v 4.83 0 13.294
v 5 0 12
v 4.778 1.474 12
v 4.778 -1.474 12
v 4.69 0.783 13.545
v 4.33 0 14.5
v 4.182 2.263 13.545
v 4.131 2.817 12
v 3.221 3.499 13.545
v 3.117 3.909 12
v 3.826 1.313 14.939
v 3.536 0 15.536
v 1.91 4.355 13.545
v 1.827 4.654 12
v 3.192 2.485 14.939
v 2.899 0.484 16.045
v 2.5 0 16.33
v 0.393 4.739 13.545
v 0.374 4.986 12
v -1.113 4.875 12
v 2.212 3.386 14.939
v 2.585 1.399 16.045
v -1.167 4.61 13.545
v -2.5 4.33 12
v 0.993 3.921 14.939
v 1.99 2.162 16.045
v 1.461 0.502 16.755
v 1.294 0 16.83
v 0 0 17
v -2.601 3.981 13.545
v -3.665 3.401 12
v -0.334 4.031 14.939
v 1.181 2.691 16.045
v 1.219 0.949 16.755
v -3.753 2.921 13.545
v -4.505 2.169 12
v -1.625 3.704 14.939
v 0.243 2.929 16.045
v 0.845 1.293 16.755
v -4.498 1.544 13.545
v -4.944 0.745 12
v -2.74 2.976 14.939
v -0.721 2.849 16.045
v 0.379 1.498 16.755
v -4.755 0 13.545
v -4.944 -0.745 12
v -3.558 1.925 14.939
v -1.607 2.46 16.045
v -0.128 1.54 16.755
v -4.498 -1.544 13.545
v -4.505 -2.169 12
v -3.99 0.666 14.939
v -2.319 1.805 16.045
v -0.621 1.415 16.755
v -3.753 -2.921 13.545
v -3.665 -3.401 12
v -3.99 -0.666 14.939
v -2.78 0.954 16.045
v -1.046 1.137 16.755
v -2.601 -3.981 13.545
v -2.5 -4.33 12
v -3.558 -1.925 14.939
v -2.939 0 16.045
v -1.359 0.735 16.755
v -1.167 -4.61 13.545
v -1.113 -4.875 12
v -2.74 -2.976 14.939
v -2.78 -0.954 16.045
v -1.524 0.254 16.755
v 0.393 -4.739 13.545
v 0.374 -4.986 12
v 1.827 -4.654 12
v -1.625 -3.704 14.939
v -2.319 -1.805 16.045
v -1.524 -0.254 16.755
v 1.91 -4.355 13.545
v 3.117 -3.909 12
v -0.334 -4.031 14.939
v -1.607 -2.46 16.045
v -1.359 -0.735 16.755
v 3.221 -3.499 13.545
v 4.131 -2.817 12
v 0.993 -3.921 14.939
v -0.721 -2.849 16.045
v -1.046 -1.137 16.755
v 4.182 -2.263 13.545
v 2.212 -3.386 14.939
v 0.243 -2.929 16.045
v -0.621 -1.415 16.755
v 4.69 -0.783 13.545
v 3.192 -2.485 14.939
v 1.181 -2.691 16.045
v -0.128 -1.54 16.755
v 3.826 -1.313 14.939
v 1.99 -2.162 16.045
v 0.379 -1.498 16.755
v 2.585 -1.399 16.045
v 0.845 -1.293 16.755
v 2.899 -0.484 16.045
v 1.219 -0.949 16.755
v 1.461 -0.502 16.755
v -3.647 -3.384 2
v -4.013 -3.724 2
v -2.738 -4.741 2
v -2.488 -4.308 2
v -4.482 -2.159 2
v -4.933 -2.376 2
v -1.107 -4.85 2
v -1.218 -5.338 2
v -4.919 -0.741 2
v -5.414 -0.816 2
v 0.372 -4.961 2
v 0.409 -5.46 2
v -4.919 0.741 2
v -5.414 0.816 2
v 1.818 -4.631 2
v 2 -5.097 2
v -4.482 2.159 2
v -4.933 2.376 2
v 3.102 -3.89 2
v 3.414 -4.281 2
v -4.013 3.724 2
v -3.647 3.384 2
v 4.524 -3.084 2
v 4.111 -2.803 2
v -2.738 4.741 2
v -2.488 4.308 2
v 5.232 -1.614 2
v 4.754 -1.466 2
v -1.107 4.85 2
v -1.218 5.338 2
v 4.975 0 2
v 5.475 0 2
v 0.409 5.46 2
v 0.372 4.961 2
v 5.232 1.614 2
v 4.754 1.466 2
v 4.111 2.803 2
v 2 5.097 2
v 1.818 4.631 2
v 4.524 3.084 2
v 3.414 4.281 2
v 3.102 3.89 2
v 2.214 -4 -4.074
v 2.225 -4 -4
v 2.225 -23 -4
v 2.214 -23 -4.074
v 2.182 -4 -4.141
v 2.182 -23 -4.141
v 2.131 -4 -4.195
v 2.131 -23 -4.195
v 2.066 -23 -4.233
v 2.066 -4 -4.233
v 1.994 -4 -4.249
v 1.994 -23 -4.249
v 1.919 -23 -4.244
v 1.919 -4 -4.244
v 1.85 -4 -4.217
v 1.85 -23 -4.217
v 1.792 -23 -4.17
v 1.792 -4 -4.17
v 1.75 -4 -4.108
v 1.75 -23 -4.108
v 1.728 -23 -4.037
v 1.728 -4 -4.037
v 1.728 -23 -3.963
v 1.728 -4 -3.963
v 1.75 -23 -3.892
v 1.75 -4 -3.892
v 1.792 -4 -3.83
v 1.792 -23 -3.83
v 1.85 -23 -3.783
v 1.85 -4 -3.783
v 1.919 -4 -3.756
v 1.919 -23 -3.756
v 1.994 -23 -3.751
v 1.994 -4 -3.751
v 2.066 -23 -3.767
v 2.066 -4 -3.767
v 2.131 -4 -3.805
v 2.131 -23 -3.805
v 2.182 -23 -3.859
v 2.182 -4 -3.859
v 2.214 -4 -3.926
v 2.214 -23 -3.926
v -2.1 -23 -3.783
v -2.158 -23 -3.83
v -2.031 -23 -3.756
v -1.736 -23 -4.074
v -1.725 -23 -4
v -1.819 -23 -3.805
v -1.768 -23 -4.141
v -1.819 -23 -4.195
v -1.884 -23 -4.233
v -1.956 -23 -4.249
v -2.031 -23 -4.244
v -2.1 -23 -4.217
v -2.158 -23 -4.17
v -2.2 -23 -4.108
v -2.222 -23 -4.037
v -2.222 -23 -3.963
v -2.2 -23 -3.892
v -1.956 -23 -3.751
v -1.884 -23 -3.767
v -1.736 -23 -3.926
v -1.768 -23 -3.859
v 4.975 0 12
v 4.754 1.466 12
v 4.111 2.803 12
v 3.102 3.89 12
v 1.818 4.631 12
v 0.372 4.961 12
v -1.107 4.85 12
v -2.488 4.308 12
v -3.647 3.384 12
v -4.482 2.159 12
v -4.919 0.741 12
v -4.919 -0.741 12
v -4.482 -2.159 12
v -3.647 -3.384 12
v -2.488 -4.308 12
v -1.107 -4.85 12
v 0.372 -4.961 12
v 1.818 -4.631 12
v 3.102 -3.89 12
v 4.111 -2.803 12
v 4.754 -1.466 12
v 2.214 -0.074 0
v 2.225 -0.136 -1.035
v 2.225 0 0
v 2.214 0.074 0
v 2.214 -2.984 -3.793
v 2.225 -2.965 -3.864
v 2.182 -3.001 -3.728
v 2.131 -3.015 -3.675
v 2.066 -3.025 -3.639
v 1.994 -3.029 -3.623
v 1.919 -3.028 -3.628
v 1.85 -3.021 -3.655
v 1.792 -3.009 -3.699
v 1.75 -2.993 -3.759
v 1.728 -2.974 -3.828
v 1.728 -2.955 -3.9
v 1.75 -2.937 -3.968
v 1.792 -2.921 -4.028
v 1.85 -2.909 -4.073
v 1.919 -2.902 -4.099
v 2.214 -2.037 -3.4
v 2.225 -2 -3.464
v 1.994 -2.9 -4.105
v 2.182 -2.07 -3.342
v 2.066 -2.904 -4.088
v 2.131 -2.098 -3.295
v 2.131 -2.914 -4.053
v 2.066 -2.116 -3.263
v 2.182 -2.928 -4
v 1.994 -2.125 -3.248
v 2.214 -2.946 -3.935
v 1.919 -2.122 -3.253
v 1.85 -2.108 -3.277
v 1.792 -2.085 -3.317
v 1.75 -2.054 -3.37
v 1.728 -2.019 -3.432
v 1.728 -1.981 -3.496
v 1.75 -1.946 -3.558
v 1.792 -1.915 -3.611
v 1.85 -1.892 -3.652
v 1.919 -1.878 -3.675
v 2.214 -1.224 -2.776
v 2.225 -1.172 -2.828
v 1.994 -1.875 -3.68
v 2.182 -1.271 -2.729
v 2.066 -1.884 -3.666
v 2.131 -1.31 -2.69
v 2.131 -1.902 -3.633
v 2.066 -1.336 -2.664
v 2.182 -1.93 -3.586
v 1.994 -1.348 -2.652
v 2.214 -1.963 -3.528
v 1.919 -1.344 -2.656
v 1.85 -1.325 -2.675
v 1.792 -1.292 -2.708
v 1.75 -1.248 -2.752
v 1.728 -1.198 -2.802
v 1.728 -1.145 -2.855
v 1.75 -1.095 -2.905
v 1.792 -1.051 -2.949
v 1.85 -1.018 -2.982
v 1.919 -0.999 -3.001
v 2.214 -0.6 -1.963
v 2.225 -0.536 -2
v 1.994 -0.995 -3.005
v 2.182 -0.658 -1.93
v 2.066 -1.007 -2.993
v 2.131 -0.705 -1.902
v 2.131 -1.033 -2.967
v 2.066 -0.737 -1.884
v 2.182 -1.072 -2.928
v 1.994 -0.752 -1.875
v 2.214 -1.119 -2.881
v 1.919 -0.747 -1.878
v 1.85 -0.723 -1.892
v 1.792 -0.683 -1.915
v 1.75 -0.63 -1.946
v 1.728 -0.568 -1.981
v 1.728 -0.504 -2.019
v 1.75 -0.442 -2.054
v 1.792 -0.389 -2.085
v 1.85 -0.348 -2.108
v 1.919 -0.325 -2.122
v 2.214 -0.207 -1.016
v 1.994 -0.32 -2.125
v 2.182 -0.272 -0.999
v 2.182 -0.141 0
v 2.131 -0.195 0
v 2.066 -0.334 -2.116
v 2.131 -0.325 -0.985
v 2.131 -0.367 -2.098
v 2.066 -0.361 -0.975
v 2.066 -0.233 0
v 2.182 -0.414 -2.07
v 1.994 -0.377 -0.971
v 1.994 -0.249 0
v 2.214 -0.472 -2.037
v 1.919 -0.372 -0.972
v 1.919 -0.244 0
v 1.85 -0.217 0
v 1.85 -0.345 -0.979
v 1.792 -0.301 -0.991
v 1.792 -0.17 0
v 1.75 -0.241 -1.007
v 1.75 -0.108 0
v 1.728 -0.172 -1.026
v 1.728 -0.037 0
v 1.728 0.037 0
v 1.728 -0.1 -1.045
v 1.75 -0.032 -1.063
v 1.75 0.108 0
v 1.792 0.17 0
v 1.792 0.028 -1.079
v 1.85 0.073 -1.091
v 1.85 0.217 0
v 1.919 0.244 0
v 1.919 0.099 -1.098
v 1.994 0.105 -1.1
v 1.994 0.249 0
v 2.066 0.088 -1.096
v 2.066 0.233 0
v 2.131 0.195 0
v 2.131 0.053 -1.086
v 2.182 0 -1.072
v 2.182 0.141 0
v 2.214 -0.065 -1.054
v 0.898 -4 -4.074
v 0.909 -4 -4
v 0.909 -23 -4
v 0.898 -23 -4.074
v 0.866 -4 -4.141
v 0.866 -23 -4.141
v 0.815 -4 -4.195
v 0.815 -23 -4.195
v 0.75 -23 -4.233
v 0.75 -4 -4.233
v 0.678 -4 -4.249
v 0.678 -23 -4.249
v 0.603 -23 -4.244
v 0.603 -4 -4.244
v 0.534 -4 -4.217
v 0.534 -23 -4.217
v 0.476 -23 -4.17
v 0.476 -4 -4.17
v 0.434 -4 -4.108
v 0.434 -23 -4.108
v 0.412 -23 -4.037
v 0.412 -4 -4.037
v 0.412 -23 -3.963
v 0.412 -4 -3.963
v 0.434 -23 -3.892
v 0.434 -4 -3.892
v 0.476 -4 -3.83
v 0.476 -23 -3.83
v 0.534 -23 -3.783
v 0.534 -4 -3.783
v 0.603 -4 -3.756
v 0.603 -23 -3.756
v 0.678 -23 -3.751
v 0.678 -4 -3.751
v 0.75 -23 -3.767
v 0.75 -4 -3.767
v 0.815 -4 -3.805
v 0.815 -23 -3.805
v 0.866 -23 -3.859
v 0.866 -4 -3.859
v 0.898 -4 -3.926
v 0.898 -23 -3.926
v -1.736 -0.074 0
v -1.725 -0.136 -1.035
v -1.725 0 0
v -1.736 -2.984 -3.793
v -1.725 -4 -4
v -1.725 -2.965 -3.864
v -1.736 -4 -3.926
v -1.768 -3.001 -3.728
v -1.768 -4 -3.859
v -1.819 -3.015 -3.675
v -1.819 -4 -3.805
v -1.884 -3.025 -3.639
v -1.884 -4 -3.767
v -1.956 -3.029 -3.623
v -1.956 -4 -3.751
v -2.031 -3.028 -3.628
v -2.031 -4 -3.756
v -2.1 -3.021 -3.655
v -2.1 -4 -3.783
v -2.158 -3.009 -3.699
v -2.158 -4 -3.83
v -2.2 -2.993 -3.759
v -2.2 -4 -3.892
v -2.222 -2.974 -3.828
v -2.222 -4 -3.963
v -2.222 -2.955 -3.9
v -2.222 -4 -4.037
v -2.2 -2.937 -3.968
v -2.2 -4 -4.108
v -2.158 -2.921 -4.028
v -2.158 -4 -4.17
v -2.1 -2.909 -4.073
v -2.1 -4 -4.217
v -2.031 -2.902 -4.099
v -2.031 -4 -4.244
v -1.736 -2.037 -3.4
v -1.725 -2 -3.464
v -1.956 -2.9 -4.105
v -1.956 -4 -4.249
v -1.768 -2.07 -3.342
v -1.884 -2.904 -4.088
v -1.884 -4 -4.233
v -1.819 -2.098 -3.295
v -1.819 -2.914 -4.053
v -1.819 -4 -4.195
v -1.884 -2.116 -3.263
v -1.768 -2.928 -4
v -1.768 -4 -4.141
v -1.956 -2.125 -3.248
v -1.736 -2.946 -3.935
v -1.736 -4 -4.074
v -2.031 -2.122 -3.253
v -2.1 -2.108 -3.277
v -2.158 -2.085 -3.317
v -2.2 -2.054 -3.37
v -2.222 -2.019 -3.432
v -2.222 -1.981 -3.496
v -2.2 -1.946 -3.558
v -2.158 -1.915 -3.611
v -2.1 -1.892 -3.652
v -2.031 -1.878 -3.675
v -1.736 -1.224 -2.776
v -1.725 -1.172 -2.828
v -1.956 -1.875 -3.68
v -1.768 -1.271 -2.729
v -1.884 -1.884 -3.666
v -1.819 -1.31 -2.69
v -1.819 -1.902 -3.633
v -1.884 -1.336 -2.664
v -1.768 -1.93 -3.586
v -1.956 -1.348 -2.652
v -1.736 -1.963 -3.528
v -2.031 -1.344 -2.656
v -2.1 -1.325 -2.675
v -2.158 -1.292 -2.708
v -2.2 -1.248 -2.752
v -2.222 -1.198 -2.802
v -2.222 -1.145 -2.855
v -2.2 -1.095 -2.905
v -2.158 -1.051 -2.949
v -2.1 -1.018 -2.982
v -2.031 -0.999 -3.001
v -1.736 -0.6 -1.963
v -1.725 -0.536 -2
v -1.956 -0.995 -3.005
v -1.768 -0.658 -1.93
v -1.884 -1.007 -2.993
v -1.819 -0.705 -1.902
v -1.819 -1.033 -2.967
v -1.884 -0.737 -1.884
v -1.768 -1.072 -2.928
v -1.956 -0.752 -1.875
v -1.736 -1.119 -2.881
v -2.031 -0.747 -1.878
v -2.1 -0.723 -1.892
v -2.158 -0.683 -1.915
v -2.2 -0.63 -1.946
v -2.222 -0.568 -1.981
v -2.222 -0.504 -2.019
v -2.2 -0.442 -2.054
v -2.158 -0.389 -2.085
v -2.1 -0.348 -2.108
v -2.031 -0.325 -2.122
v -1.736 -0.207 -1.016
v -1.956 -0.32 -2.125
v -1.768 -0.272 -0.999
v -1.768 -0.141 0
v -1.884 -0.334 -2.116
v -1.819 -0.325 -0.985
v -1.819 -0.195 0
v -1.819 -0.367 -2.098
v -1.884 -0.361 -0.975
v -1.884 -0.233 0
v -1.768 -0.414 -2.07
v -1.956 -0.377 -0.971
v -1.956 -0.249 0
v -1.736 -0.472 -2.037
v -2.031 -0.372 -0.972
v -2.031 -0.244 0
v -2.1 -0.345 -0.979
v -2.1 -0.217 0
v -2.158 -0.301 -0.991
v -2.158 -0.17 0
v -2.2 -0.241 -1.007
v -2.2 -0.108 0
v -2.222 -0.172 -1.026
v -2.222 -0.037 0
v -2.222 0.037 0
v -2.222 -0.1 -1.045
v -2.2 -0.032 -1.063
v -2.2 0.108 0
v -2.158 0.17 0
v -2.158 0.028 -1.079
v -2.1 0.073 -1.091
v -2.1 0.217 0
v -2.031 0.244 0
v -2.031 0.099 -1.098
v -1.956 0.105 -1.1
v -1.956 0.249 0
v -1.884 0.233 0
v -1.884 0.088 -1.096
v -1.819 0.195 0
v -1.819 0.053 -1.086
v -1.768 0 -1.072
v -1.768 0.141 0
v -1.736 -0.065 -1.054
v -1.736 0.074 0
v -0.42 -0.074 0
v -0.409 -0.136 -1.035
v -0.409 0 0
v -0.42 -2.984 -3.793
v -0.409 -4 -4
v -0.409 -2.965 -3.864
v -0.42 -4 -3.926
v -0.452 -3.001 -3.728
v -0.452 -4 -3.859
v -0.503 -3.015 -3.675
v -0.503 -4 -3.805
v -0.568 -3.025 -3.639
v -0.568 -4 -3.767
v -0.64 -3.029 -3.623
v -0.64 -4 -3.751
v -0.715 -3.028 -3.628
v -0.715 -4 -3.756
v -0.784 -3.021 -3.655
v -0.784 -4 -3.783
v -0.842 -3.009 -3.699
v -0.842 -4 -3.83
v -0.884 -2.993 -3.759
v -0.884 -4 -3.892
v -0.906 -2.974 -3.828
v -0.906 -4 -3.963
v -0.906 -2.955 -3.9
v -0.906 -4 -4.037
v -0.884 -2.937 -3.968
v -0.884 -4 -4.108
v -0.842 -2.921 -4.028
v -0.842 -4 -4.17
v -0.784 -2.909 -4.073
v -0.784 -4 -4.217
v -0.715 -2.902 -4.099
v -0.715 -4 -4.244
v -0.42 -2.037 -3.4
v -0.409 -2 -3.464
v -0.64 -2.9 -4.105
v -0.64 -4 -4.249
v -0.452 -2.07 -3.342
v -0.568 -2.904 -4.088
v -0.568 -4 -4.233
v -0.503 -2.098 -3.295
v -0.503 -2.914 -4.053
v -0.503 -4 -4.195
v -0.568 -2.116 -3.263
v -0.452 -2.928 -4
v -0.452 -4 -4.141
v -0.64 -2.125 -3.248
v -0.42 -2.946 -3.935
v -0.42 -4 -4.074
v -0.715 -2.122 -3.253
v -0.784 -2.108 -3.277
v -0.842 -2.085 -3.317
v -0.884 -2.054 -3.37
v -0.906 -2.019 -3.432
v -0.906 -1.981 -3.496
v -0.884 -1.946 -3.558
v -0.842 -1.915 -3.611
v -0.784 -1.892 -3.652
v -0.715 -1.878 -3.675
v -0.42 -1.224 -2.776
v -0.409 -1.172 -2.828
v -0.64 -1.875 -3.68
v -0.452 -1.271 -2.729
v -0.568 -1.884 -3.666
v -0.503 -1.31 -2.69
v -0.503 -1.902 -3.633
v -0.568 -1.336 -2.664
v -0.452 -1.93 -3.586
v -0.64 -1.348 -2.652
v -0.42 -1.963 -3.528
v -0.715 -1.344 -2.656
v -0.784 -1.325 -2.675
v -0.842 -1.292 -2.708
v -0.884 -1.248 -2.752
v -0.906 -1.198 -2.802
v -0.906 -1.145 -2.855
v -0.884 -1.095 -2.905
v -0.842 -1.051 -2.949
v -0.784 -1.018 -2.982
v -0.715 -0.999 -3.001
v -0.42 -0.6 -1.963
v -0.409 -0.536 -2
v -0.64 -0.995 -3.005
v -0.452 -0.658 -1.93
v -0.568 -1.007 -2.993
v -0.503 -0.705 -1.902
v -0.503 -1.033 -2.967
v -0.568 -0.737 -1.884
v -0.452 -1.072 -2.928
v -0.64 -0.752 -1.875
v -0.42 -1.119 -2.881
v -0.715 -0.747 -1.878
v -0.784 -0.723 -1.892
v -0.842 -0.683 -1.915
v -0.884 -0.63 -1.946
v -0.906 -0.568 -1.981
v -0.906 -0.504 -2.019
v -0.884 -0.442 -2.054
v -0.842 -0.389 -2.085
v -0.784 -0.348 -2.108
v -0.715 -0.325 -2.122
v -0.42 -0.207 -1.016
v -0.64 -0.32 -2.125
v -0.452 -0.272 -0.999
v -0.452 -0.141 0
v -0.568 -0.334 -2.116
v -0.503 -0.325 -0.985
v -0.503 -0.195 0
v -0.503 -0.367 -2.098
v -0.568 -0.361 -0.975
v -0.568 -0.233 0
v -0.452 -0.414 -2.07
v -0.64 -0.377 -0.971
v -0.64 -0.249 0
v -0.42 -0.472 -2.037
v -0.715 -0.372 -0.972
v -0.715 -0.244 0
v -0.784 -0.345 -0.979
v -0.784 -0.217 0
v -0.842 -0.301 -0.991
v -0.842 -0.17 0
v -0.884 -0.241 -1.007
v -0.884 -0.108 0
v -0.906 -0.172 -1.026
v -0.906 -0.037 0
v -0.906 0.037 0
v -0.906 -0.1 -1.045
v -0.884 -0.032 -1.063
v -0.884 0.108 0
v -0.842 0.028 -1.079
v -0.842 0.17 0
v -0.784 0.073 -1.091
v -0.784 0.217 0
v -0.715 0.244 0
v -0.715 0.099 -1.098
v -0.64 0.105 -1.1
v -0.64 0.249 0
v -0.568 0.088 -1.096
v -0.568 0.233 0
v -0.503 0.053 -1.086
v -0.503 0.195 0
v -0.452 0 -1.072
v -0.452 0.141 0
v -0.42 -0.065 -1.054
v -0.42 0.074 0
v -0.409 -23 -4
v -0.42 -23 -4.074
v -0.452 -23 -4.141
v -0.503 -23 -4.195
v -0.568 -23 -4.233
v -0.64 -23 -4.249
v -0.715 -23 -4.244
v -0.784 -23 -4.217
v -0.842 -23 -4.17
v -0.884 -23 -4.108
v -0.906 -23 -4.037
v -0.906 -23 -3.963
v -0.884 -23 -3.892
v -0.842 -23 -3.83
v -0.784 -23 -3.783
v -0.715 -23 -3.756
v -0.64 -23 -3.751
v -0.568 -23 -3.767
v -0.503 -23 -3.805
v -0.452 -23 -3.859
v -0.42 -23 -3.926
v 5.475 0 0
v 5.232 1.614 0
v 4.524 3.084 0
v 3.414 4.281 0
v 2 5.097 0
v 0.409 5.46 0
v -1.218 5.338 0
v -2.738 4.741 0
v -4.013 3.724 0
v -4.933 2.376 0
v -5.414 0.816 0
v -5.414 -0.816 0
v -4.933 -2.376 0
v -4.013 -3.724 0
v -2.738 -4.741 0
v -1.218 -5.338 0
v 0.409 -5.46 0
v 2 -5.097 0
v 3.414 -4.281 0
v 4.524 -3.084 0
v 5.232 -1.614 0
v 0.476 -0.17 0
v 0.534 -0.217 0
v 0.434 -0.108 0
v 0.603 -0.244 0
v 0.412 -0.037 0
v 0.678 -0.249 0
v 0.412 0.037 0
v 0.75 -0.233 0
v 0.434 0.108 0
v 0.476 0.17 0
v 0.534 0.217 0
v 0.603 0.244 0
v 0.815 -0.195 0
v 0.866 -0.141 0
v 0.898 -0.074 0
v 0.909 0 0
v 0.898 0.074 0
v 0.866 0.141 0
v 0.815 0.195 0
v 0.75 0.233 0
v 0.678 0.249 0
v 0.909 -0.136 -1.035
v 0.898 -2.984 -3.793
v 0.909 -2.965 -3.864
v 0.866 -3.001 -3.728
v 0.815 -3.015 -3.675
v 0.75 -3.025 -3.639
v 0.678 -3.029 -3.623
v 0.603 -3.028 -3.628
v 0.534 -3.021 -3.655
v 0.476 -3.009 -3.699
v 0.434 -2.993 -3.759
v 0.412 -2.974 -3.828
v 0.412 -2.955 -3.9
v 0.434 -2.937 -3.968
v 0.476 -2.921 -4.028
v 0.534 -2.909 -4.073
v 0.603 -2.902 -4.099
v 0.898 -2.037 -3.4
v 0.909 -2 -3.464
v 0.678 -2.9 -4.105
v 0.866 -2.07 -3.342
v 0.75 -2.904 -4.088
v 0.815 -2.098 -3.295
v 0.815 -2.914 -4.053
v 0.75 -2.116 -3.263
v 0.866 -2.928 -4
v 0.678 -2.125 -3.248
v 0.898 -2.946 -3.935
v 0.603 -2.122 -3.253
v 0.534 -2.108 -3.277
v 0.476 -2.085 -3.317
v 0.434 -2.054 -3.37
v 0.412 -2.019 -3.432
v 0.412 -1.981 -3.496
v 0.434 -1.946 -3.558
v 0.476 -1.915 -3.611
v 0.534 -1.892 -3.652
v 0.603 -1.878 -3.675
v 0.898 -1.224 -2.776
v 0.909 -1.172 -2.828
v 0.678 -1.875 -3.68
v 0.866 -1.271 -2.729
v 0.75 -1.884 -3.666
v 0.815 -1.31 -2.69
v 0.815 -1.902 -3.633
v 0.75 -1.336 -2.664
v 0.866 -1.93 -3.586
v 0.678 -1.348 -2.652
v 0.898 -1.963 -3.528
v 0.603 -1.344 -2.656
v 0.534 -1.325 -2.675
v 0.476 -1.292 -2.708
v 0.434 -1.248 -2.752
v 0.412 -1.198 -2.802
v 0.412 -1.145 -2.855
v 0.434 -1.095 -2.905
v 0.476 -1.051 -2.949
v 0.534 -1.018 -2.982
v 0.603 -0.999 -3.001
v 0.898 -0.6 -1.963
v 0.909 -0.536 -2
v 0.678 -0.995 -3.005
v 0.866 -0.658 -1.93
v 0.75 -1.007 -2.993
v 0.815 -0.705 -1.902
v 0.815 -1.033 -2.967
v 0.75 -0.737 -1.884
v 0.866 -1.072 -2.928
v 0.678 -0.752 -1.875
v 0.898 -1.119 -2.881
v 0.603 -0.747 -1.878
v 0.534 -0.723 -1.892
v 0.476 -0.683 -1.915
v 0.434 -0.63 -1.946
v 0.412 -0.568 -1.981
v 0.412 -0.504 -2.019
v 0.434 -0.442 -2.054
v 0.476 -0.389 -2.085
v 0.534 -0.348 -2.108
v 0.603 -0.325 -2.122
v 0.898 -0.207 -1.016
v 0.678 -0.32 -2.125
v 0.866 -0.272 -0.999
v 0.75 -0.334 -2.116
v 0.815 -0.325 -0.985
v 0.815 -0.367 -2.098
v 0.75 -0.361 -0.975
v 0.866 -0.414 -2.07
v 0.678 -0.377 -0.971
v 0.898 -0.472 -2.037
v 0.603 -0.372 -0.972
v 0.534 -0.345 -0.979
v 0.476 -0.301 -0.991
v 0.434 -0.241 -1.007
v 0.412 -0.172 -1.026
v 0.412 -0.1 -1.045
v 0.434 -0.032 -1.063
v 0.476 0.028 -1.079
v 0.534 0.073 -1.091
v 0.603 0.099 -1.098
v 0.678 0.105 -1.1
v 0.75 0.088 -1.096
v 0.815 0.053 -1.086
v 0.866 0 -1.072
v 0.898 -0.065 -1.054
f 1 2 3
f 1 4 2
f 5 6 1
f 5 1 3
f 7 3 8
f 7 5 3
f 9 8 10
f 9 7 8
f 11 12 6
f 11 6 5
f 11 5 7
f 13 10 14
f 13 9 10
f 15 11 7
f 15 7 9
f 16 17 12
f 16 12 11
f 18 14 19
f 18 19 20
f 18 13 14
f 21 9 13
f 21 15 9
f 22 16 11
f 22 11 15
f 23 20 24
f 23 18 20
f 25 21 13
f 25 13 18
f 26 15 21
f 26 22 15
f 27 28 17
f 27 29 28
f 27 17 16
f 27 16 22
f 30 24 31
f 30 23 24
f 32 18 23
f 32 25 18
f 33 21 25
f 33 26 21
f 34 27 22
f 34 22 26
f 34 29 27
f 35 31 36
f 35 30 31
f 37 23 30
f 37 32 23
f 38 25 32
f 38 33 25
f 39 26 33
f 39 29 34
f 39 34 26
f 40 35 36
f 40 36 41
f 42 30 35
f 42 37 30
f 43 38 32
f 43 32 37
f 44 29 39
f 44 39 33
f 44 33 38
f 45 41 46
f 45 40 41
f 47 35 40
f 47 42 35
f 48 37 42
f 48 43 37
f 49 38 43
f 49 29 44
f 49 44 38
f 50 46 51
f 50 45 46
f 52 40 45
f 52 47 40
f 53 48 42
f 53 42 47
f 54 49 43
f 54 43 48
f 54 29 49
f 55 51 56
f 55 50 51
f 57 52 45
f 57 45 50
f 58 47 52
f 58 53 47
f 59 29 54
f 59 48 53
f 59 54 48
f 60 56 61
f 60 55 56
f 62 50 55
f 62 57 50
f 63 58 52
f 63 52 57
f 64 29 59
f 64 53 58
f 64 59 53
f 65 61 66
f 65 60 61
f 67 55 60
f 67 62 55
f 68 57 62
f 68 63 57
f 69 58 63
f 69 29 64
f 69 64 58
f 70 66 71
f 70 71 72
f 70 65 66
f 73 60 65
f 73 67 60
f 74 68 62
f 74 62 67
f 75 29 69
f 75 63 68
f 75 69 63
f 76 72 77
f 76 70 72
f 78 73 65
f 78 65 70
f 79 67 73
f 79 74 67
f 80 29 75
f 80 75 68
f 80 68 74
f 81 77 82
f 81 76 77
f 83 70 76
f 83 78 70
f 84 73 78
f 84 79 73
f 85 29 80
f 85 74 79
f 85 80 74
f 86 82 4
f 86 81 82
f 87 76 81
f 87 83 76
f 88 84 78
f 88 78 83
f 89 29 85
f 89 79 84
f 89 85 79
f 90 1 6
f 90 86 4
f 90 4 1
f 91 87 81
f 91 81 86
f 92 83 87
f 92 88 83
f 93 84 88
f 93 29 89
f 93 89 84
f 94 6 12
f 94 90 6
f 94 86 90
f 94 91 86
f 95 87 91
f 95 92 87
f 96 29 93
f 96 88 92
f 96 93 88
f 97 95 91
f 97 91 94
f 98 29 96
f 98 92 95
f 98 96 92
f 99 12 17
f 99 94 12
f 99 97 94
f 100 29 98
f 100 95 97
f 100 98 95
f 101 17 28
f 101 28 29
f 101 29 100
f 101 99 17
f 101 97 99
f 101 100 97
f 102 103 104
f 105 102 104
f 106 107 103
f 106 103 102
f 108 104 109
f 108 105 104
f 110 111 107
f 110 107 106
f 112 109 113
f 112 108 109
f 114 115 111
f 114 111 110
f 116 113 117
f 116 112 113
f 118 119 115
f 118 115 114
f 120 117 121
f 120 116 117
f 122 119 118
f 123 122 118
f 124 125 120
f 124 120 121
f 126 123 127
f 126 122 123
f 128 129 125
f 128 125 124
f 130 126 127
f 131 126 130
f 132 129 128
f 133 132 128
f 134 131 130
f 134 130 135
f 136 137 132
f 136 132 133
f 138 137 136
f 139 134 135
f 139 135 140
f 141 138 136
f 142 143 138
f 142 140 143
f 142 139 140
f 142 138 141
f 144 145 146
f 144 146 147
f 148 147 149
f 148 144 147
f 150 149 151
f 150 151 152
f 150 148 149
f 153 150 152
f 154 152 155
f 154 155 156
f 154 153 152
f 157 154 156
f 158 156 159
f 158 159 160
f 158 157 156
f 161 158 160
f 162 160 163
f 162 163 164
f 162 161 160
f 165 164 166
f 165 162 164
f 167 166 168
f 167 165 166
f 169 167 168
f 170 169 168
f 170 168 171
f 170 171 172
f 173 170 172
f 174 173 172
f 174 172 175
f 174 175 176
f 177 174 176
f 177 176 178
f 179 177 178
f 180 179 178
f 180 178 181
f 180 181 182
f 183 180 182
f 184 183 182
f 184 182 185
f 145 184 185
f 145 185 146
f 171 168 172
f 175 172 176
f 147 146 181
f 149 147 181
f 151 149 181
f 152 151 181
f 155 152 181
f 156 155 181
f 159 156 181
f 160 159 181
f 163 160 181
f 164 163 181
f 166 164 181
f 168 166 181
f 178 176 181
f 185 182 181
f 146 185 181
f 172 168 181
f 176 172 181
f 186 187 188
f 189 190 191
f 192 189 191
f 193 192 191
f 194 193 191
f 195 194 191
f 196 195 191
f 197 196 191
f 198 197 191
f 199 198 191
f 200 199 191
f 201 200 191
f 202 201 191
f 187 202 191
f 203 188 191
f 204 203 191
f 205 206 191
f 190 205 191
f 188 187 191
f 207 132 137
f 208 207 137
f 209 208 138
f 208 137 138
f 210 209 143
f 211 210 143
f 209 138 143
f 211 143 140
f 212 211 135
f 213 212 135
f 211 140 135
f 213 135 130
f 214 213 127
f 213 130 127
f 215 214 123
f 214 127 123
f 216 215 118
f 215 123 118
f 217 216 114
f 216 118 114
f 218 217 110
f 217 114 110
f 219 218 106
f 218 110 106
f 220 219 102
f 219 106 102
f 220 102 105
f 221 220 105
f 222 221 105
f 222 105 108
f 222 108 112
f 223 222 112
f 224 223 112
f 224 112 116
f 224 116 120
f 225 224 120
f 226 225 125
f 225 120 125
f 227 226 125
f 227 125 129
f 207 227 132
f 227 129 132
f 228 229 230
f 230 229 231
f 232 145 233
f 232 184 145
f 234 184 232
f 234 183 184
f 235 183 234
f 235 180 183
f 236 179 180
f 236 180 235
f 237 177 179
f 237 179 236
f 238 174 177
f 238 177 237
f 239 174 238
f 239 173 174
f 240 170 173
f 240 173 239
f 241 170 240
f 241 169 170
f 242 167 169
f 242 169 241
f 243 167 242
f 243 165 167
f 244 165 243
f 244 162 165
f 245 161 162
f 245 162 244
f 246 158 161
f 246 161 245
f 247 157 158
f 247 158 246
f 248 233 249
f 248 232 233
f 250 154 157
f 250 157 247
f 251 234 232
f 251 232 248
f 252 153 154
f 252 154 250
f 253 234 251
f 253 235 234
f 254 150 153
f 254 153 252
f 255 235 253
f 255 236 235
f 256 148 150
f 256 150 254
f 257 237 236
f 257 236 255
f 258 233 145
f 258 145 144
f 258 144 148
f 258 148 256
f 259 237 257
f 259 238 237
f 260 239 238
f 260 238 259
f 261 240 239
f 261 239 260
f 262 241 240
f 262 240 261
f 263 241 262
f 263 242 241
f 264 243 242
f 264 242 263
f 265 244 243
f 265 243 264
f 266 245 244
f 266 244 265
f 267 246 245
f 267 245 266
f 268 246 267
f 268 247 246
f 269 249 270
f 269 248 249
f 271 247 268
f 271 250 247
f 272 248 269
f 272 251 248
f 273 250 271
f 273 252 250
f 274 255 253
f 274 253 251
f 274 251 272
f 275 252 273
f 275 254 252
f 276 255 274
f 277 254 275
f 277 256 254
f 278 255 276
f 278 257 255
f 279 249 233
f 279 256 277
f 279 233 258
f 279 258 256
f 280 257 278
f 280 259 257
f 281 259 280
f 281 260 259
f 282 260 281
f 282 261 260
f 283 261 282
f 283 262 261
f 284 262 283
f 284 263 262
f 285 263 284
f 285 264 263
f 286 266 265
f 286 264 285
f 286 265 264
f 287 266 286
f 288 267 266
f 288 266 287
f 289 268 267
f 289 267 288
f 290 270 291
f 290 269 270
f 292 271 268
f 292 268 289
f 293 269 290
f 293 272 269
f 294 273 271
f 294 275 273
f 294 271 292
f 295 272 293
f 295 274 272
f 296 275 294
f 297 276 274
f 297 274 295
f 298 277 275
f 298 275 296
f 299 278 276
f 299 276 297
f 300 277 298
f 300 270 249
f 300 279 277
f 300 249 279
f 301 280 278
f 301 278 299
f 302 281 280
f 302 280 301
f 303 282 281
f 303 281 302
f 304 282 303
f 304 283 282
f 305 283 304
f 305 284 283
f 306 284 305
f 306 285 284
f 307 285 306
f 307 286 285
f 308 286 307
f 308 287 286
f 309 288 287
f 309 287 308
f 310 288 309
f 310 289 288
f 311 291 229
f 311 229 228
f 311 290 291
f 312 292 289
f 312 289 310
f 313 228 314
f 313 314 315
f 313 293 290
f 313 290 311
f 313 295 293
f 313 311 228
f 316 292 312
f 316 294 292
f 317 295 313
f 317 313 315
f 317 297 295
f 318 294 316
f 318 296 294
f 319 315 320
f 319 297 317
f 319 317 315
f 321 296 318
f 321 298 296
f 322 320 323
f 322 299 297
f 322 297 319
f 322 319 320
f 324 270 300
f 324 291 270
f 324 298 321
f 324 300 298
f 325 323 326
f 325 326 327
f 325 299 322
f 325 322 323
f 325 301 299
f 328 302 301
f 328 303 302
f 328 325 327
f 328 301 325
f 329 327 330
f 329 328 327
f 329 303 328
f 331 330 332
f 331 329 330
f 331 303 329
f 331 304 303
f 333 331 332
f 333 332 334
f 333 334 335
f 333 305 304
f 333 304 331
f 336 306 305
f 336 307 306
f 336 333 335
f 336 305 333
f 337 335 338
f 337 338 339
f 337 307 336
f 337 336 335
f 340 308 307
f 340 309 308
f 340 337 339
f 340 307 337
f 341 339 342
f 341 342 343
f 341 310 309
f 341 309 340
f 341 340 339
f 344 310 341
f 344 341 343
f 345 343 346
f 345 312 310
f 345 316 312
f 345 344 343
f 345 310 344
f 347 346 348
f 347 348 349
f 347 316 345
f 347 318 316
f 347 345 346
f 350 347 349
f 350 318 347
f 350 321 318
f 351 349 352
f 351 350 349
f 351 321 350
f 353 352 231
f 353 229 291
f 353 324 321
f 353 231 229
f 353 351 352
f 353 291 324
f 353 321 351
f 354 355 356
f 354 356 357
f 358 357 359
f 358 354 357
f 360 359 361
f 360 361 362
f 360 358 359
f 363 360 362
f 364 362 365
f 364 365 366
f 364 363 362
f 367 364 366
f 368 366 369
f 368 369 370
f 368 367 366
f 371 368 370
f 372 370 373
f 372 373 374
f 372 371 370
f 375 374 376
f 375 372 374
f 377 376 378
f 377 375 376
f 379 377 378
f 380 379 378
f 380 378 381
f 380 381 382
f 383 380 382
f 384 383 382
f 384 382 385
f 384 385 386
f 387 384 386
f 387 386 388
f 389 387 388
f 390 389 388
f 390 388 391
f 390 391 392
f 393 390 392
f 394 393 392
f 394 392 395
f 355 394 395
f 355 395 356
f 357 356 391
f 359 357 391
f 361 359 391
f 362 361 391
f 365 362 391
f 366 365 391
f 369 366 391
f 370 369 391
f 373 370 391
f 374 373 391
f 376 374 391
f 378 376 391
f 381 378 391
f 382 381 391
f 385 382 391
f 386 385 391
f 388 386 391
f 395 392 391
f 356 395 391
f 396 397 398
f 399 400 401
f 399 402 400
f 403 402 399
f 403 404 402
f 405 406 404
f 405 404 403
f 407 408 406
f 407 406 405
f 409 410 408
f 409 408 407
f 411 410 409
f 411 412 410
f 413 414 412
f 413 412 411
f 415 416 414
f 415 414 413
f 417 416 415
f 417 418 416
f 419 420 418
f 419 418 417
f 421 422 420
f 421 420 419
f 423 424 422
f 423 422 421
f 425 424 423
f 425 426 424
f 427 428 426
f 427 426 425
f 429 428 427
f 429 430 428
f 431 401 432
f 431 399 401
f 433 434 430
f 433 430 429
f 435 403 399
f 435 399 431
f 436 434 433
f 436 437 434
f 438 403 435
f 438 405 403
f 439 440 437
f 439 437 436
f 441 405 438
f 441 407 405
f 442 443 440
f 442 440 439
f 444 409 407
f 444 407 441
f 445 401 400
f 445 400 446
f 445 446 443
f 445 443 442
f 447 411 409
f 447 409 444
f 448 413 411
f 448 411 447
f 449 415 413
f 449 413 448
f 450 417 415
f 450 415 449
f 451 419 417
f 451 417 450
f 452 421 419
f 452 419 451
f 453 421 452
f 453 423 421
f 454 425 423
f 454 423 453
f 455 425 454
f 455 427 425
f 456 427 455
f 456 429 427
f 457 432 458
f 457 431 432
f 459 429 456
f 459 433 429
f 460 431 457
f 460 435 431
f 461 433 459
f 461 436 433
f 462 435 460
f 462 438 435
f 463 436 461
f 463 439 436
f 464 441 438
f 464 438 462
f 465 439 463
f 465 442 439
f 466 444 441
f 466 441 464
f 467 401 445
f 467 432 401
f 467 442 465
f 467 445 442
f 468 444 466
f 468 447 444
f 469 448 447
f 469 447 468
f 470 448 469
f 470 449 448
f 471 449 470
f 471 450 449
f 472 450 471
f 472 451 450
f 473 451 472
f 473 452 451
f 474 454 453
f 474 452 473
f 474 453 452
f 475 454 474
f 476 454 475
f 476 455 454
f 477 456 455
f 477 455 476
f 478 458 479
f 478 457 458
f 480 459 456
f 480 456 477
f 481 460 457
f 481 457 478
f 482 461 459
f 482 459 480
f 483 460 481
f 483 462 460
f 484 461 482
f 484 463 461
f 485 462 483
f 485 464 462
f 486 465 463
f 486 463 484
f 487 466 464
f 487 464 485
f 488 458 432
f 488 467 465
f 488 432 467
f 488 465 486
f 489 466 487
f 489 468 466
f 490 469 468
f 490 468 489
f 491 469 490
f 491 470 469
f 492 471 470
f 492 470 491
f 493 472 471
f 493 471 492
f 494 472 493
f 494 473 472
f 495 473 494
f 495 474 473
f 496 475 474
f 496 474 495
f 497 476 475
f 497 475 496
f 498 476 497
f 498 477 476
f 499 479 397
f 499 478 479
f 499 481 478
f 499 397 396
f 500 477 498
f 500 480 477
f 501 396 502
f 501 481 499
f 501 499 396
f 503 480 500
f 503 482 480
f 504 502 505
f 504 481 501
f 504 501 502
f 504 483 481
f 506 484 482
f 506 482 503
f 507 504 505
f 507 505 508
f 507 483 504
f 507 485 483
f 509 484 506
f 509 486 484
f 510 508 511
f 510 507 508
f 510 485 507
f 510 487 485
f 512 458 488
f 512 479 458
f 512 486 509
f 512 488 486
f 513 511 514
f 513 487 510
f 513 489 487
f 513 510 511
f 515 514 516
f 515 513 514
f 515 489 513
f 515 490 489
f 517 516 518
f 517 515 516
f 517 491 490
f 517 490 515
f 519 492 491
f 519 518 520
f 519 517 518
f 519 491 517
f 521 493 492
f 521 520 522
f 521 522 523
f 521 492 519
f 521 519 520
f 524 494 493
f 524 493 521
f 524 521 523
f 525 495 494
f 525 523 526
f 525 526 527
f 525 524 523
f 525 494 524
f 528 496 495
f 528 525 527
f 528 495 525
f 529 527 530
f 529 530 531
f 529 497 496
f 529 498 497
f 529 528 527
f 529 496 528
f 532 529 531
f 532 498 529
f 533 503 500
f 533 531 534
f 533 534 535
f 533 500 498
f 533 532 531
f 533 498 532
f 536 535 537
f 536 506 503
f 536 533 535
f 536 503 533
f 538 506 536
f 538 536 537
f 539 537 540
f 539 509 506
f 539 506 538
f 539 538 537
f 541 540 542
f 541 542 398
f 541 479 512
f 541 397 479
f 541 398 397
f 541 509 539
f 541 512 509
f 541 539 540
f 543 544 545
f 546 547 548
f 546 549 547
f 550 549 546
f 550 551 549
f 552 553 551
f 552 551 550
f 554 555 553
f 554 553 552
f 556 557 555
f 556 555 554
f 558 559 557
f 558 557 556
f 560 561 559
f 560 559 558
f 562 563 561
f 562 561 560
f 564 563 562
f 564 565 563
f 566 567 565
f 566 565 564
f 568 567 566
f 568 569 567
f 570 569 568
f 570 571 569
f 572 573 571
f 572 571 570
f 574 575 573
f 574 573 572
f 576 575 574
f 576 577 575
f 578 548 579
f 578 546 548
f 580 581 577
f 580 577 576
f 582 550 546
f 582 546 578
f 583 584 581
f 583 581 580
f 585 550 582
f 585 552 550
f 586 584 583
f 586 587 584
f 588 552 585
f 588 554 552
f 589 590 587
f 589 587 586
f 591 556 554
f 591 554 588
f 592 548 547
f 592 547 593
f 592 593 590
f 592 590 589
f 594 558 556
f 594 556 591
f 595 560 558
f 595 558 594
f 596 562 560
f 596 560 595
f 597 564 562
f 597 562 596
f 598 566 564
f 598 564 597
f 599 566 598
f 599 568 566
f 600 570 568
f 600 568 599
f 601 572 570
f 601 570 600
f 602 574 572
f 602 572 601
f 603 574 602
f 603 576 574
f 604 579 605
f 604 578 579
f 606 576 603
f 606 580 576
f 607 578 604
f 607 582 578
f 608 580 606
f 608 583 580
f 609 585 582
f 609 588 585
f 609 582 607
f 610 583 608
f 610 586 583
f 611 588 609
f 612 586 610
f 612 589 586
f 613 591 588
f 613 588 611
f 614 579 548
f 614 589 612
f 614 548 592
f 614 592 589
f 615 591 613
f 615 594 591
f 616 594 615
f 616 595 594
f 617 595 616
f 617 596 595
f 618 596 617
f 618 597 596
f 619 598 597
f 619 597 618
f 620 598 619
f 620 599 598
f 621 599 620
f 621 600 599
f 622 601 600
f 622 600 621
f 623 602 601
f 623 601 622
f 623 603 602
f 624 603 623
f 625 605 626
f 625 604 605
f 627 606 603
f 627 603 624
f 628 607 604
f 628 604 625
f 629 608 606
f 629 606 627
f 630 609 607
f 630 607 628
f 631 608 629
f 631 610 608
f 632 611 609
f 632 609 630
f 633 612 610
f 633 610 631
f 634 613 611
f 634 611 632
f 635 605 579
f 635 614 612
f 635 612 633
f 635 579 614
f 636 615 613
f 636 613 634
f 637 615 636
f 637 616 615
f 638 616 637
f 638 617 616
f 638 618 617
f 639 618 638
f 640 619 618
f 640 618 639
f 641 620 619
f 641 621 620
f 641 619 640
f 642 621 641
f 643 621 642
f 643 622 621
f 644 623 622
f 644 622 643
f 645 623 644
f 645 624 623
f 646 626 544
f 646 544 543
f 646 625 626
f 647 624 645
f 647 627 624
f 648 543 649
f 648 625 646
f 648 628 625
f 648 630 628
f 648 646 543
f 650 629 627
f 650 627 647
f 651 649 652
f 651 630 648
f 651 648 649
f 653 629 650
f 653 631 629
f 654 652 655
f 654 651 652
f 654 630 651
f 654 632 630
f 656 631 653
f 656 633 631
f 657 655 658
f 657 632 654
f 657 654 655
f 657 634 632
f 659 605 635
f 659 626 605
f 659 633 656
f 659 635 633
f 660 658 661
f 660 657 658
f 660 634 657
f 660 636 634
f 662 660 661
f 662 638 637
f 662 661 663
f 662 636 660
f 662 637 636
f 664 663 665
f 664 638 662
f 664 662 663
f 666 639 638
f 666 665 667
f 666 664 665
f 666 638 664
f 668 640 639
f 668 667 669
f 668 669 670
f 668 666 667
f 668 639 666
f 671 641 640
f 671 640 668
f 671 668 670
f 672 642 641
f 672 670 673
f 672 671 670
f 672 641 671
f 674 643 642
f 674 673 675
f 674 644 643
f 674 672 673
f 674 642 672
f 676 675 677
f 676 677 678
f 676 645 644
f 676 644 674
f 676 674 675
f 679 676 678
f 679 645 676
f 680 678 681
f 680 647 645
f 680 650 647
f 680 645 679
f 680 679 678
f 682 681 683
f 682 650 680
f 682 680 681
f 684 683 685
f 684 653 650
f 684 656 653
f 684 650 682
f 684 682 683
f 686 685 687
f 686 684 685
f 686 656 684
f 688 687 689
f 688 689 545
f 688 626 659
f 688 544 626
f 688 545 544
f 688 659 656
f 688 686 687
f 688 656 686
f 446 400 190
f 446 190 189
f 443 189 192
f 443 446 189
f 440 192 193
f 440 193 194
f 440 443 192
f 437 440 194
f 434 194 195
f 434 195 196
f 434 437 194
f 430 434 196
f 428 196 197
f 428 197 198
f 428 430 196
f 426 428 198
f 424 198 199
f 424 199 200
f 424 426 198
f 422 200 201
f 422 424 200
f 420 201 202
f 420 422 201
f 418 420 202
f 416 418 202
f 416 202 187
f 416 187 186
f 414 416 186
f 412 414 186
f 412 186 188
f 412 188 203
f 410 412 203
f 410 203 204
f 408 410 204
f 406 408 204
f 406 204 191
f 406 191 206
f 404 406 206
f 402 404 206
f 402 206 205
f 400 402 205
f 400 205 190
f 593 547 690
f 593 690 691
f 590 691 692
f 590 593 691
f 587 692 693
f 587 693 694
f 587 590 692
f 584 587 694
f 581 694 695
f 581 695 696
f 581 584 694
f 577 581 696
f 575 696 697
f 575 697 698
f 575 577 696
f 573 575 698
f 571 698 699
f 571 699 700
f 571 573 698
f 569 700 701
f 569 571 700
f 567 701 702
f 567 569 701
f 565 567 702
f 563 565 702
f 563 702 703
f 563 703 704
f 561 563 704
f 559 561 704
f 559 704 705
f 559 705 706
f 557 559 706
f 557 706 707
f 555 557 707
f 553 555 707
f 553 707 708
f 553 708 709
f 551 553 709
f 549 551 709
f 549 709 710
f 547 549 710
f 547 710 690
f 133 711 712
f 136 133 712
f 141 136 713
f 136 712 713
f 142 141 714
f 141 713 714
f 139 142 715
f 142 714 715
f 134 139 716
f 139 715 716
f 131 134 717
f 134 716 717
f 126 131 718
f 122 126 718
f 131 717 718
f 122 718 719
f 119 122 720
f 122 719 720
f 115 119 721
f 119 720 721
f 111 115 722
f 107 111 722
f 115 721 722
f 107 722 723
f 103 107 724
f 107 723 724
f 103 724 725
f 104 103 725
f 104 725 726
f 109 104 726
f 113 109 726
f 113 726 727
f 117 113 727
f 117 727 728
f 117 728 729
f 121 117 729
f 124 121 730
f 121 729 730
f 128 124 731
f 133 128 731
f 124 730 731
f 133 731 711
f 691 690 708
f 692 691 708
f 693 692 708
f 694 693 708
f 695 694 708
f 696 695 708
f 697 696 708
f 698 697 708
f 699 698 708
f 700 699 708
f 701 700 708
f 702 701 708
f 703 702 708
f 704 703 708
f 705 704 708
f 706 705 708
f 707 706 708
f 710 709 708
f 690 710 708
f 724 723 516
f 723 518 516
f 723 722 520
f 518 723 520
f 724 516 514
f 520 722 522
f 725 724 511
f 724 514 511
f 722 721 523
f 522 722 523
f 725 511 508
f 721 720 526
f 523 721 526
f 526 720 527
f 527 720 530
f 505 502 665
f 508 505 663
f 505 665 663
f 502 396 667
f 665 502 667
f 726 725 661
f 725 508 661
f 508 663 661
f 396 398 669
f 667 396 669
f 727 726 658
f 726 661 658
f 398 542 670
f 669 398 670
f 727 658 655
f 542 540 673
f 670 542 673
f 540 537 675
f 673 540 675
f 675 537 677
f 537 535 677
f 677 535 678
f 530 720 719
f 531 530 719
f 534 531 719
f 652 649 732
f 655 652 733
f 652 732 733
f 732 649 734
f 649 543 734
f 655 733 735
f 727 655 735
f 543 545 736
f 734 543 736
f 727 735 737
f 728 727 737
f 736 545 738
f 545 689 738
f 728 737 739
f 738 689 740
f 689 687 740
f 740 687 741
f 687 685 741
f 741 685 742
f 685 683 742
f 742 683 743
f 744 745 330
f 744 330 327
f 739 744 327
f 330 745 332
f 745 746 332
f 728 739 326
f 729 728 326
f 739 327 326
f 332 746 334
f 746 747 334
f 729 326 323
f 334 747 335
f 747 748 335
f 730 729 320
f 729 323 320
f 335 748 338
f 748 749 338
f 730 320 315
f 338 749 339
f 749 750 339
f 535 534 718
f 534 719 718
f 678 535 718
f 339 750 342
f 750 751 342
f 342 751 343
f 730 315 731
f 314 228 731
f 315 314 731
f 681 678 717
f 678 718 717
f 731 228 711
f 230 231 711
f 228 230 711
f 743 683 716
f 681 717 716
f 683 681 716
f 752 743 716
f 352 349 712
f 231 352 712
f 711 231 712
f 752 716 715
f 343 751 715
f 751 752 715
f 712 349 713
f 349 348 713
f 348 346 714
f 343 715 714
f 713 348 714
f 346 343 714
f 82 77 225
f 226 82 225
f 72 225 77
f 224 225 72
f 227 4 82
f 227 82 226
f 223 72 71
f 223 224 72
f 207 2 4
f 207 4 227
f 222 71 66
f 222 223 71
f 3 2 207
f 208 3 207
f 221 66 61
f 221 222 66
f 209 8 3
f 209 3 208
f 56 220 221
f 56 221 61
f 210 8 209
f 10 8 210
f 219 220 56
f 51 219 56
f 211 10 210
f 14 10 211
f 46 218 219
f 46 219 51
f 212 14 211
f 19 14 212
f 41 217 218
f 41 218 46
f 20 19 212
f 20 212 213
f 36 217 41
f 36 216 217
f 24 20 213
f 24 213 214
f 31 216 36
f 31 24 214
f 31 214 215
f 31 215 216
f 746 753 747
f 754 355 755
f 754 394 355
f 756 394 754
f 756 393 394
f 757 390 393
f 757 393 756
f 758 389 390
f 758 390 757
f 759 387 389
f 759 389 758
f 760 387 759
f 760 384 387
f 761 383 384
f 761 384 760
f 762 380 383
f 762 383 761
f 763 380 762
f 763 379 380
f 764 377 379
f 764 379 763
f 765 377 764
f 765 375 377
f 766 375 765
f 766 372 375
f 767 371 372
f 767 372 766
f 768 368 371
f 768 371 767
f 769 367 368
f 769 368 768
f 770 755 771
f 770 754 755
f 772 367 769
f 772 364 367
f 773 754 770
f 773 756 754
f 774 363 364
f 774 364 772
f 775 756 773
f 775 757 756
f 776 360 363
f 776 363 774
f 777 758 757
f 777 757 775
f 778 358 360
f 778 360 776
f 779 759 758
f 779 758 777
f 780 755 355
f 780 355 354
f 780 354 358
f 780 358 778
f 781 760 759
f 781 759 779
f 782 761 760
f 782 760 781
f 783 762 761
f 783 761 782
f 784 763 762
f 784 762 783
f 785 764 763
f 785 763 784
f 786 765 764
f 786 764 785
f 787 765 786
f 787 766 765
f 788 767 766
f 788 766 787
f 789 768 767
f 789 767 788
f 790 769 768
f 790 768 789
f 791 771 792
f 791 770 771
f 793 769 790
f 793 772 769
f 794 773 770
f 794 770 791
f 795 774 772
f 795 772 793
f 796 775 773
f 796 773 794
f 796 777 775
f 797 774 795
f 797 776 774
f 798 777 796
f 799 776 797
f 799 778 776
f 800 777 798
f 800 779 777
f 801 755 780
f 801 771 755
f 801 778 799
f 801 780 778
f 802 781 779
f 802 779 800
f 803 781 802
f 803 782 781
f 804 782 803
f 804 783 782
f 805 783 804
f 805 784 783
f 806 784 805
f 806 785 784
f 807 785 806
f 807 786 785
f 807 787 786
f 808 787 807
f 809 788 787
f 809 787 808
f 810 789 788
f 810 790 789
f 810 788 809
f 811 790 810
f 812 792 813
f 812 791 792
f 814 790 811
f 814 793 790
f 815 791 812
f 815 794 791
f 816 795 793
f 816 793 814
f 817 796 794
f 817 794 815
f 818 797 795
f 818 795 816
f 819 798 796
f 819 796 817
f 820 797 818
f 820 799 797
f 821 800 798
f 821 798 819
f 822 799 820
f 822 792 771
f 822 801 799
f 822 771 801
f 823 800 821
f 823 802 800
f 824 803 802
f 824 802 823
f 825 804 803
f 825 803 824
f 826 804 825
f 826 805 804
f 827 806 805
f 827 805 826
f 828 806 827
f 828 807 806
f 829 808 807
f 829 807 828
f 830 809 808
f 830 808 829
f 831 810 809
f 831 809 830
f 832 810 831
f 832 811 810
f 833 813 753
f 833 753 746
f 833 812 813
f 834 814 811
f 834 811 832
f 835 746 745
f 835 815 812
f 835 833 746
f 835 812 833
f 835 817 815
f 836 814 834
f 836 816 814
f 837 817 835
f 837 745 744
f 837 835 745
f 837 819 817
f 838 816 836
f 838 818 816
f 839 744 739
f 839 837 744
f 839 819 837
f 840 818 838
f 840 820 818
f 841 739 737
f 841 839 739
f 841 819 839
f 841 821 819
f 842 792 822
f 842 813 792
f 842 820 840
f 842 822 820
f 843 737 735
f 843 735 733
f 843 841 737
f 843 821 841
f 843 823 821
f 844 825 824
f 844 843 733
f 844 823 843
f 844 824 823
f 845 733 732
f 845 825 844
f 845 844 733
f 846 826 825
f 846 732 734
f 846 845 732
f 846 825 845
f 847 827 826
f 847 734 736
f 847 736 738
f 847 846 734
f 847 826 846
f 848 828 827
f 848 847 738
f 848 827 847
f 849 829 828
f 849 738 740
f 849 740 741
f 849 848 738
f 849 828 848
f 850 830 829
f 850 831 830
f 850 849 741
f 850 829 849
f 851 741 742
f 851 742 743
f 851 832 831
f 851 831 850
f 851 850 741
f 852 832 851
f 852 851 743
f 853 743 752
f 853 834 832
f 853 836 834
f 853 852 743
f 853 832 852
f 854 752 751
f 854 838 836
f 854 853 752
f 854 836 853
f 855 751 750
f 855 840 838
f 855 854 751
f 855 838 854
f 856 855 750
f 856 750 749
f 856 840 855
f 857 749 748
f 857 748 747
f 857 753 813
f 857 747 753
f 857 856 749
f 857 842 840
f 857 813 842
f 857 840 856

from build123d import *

# Parameters (mm, degrees)
F0_R     = 5.475
F1_DEPTH = 2
F2_R     = 4.975
F3_DEPTH = 10
F6_R     = 0.25


with BuildPart() as f1:
    # F0 (on Top) → F1 (new body)
    with BuildSketch(Plane.XY):
        Circle(F0_R)
    extrude(amount=F1_DEPTH)

    # F2 (on face) → F3 (join)
    with BuildSketch(Plane.XY.offset(2)):
        Circle(F2_R)
    extrude(amount=F3_DEPTH)

    # F4 (on Front) → F5 (revolve)
    with BuildSketch(Plane.XZ):
        with BuildLine():
            Line((0, 17), (0, 12))
            Line((0, 12), (5, 12))
            ThreePointArc((5, 12), (3.5355339059, 15.5355339059), (0, 17))
        make_face()
    revolve(axis=Axis((0, 0, 14.5), (0, 0, 1)))

    # F9: sweep along a path in F8
    with BuildLine(Plane.YZ.offset(1.974)) as f9_path:
        Line((-23, -4), (-4, -4))
        ThreePointArc((-4, -4), (-1.1715728753, -2.8284271247), (0, 0))
    # F6 (on Top) → F9 (sweep)
    with BuildSketch(Plane.XY):
        with Locations((-1.975, 0)):
            Circle(F6_R)
        with Locations((1.975, 0)):
            Circle(F6_R)
        with Locations((-0.659, 0)):
            Circle(F6_R)
        with Locations((0.659, 0)):
            Circle(F6_R)
    sweep(path=f9_path.line)


solid = f1.part
